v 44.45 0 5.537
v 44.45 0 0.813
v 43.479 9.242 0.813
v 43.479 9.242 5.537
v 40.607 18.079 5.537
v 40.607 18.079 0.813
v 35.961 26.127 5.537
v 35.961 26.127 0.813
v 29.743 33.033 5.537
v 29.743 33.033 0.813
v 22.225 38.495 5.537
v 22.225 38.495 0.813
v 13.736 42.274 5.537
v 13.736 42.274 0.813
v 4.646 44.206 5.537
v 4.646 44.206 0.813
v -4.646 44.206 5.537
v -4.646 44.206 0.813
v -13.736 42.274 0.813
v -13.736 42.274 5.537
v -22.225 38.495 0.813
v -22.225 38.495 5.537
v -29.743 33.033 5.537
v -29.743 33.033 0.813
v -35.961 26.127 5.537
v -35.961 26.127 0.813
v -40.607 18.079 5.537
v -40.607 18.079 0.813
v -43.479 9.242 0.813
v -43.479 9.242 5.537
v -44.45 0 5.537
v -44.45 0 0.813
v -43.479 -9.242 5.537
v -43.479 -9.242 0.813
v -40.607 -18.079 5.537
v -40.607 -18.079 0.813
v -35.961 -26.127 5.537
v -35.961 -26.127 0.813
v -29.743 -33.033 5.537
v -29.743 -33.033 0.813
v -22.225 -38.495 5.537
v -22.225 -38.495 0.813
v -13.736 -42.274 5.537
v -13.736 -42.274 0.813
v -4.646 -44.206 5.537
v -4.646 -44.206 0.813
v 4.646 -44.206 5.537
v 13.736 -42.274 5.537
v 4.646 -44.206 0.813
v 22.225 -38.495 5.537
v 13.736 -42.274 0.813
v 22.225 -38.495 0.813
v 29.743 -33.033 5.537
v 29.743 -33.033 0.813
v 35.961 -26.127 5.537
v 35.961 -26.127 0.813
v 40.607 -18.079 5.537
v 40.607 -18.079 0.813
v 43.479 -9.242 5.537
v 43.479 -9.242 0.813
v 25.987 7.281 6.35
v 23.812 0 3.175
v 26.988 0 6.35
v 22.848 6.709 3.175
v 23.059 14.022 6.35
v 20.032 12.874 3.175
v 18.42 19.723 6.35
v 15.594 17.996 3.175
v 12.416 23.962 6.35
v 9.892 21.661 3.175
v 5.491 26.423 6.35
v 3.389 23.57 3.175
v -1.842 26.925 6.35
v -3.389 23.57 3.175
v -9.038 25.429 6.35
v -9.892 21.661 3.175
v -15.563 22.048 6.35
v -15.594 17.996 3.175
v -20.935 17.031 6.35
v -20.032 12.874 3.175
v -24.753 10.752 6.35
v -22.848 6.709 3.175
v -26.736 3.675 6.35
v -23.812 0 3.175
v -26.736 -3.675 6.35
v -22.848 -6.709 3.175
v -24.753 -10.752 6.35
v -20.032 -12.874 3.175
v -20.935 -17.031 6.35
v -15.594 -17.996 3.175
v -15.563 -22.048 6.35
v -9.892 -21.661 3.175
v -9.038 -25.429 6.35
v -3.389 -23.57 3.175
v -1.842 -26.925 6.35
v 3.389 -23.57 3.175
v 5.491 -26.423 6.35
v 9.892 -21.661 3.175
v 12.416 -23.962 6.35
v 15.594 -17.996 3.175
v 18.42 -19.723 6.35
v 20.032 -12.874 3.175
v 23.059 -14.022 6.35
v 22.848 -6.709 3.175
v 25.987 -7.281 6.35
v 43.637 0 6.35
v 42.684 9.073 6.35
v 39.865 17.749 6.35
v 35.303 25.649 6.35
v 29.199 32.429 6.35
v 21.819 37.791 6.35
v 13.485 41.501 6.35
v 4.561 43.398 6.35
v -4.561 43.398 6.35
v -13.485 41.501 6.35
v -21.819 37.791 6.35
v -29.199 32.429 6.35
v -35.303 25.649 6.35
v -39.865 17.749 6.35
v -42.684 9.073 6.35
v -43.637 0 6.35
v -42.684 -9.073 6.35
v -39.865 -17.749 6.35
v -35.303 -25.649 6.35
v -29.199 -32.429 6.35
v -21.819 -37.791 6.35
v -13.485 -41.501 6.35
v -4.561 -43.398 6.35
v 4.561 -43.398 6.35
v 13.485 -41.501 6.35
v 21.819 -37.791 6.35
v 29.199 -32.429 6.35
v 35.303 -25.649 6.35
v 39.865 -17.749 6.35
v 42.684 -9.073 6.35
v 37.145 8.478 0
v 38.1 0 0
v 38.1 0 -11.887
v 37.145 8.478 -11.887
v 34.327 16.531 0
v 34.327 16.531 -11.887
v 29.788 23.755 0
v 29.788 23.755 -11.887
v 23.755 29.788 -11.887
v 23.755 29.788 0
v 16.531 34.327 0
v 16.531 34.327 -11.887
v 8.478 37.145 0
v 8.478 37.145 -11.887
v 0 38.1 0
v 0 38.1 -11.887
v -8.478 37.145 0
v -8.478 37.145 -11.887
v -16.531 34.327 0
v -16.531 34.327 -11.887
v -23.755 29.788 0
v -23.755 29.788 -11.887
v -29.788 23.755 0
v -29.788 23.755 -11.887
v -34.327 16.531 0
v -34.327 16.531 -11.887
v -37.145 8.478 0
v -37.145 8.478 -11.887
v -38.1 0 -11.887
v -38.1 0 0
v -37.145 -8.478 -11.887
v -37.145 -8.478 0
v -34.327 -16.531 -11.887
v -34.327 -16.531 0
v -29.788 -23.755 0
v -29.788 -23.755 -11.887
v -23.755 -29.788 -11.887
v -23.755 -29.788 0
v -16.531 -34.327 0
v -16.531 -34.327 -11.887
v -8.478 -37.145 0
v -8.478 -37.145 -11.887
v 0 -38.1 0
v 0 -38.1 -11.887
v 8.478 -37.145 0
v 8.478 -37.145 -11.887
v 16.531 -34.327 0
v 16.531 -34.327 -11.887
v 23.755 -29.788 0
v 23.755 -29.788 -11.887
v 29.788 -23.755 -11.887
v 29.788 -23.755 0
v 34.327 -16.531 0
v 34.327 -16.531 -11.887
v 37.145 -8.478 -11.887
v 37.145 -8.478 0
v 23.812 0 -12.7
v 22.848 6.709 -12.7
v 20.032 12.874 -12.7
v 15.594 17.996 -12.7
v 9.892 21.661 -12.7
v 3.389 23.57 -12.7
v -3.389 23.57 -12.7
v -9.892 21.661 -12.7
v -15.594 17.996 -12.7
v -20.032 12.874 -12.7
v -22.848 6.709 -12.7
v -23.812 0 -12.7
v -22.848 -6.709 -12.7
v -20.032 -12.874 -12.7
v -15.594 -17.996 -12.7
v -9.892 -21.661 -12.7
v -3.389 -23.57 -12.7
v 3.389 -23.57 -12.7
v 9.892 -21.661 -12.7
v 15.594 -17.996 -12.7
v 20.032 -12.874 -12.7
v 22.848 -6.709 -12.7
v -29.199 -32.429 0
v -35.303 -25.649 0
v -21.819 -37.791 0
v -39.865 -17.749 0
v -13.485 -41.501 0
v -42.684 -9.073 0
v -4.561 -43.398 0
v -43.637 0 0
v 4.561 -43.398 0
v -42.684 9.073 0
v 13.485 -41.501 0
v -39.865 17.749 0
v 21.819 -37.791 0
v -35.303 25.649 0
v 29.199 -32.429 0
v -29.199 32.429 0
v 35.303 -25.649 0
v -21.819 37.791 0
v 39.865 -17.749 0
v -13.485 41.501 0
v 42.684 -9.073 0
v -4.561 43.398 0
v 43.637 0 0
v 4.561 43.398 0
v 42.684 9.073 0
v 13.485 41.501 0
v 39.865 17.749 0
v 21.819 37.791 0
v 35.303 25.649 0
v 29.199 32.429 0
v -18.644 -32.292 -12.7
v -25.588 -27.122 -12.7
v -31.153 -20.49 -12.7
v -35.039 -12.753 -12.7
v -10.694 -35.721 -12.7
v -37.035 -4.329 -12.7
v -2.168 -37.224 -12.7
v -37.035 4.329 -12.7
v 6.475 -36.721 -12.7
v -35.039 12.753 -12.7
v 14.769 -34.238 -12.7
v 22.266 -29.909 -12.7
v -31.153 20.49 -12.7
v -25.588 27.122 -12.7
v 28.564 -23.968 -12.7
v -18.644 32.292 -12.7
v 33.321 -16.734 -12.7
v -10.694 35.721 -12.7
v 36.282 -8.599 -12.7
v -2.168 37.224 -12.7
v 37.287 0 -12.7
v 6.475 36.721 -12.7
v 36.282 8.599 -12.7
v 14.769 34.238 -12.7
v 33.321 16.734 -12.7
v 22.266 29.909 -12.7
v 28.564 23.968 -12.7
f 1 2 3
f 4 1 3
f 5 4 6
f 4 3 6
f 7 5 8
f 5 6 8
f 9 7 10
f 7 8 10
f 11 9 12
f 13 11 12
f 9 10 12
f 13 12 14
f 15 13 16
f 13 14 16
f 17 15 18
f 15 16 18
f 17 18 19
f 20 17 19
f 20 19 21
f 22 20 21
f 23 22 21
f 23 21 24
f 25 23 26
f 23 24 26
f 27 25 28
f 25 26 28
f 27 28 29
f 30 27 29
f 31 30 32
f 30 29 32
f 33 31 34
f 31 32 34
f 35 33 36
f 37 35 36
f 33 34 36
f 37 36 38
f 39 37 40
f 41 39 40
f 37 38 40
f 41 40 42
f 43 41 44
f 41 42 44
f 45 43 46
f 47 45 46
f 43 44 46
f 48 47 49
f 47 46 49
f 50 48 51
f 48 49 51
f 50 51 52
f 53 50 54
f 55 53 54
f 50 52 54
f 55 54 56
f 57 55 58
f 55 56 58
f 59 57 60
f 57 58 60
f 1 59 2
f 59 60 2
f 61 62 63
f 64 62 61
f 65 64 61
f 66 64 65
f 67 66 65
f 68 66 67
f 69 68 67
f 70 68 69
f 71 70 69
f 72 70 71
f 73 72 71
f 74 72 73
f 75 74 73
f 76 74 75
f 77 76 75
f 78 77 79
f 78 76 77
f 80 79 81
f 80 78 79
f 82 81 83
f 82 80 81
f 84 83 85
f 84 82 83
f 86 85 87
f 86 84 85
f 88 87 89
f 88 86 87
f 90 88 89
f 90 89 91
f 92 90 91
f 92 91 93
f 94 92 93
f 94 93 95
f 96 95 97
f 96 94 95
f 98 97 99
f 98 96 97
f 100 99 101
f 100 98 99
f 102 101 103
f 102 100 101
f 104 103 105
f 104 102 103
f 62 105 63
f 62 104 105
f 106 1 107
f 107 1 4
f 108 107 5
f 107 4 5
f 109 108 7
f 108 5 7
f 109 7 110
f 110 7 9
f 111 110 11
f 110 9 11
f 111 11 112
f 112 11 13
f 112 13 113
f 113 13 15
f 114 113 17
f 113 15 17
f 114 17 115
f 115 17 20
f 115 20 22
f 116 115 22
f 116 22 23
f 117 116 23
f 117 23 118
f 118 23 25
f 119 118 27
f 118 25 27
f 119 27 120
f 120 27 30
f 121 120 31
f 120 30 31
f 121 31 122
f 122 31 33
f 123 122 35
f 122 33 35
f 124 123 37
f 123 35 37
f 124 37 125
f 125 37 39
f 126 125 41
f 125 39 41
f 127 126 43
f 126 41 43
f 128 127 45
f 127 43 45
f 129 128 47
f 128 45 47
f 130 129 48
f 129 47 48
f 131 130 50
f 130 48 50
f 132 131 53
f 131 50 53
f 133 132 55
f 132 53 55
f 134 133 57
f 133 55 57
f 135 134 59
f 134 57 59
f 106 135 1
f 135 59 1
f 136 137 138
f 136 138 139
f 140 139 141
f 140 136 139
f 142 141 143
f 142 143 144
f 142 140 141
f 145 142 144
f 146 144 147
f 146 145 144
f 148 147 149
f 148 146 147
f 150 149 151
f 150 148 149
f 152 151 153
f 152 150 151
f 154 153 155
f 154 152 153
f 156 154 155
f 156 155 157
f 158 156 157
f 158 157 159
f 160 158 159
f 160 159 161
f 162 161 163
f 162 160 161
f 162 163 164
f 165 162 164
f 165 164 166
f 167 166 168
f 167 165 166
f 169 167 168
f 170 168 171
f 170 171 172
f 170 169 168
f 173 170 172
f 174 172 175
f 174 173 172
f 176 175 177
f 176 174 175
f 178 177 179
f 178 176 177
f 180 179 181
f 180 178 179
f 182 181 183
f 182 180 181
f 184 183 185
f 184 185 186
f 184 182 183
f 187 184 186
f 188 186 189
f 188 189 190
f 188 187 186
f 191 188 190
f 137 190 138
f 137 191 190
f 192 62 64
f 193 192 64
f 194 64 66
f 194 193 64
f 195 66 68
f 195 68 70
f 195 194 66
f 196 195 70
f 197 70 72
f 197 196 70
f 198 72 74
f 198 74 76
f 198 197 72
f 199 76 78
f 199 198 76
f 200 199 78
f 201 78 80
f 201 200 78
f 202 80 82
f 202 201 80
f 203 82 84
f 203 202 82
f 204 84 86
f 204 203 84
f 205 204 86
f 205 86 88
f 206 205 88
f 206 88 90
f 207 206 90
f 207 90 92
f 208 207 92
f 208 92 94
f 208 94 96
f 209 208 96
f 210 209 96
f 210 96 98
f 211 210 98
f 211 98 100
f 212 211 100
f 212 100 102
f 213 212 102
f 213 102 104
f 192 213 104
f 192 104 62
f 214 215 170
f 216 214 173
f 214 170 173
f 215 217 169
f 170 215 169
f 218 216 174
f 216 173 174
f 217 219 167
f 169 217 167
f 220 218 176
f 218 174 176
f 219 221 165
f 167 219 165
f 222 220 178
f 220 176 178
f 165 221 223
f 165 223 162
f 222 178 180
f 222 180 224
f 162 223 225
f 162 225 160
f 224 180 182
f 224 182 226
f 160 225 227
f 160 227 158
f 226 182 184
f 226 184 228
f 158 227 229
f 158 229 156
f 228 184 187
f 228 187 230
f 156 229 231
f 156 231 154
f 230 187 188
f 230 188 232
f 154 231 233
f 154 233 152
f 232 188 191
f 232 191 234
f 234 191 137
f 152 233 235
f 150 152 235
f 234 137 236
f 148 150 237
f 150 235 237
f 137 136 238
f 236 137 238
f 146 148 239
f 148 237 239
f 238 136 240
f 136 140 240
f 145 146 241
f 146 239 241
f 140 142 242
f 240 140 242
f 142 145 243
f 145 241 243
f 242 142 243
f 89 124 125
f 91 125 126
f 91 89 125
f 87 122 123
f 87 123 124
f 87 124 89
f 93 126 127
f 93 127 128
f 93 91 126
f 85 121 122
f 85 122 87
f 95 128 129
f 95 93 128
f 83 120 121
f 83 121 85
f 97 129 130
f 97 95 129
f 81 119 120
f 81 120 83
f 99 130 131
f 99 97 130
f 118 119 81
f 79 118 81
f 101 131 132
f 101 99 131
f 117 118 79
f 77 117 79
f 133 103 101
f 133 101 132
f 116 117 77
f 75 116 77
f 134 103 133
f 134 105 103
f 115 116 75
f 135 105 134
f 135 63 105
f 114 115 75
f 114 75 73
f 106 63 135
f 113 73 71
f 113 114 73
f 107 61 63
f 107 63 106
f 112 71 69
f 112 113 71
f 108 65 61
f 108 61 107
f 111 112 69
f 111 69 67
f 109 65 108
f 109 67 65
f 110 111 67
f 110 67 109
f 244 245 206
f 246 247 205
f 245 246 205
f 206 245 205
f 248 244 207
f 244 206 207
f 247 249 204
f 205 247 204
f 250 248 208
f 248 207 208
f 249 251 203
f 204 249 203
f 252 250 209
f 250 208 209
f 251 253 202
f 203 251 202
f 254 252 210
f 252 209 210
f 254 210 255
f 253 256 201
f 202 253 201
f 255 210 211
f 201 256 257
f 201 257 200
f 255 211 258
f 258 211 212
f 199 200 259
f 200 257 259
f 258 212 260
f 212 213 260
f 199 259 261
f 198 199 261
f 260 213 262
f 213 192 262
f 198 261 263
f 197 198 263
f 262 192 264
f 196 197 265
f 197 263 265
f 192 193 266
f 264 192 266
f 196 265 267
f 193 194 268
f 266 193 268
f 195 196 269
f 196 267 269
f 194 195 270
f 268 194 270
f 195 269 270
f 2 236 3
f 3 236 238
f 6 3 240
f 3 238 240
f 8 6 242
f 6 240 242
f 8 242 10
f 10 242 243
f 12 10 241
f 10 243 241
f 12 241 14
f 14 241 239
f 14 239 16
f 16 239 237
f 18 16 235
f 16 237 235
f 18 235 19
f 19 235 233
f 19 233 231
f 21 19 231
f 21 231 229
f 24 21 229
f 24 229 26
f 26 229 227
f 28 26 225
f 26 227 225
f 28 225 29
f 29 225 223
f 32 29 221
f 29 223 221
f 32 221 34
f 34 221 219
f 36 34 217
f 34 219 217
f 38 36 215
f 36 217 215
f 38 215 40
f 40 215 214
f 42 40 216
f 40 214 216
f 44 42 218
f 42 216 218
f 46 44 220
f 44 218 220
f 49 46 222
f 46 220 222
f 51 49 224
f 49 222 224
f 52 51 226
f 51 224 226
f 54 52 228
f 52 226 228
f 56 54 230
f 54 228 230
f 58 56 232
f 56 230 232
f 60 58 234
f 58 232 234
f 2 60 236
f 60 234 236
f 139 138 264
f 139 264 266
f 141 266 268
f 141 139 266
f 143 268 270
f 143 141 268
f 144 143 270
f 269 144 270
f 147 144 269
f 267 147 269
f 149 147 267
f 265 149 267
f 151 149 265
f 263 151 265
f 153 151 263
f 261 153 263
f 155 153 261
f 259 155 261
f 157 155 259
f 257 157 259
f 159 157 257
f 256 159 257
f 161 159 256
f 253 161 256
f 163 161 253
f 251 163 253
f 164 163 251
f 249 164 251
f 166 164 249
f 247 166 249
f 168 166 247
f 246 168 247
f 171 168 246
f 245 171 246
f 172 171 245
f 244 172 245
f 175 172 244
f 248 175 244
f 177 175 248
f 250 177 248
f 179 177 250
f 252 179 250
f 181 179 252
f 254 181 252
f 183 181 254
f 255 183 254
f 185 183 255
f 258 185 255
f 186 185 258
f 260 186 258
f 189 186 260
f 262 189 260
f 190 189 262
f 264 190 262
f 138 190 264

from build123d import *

# Parameters (mm, degrees)
F0_R        = 38.1
F0_R_2      = 23.8125
F1_DEPTH    = 12.7
F0_R_3      = 44.45
F1_FACE_R   = 38.1
F1_FACE_R_2 = 23.8125
F2_DEPTH    = 6.35
F3_SIZE     = 3.175
F4_SIZE     = 0.8128


with BuildPart() as f1:
    # F0 (on Top) → F1 (new body)
    with BuildSketch(Plane.XY):
        Circle(F0_R)
        Circle(F0_R_2, mode=Mode.SUBTRACT)
    extrude(amount=-F1_DEPTH)

    # F0 (on Top) + F1_face (on face) → F2 (join)
    with BuildSketch(Plane.XY):
        Circle(F0_R_3)
        Circle(F0_R, mode=Mode.SUBTRACT)
    with BuildSketch(Plane.XY):
        Circle(F1_FACE_R)
        Circle(F1_FACE_R_2, mode=Mode.SUBTRACT)
    extrude(amount=F2_DEPTH)

    # F3
    f3_edges = [f1.edges().sort_by_distance(p)[0] for p in [
        (-23.8125, 0, 6.35),
    ]]
    chamfer(f3_edges, length=F3_SIZE)

    # F4
    f4_edges = [f1.edges().sort_by_distance(p)[0] for p in [
        (-44.45, 0, 6.35),
        (-44.45, 0, 0),
        (-38.1, 0, -12.7),
    ]]
    chamfer(f4_edges, length=F4_SIZE)


solid = f1.part
